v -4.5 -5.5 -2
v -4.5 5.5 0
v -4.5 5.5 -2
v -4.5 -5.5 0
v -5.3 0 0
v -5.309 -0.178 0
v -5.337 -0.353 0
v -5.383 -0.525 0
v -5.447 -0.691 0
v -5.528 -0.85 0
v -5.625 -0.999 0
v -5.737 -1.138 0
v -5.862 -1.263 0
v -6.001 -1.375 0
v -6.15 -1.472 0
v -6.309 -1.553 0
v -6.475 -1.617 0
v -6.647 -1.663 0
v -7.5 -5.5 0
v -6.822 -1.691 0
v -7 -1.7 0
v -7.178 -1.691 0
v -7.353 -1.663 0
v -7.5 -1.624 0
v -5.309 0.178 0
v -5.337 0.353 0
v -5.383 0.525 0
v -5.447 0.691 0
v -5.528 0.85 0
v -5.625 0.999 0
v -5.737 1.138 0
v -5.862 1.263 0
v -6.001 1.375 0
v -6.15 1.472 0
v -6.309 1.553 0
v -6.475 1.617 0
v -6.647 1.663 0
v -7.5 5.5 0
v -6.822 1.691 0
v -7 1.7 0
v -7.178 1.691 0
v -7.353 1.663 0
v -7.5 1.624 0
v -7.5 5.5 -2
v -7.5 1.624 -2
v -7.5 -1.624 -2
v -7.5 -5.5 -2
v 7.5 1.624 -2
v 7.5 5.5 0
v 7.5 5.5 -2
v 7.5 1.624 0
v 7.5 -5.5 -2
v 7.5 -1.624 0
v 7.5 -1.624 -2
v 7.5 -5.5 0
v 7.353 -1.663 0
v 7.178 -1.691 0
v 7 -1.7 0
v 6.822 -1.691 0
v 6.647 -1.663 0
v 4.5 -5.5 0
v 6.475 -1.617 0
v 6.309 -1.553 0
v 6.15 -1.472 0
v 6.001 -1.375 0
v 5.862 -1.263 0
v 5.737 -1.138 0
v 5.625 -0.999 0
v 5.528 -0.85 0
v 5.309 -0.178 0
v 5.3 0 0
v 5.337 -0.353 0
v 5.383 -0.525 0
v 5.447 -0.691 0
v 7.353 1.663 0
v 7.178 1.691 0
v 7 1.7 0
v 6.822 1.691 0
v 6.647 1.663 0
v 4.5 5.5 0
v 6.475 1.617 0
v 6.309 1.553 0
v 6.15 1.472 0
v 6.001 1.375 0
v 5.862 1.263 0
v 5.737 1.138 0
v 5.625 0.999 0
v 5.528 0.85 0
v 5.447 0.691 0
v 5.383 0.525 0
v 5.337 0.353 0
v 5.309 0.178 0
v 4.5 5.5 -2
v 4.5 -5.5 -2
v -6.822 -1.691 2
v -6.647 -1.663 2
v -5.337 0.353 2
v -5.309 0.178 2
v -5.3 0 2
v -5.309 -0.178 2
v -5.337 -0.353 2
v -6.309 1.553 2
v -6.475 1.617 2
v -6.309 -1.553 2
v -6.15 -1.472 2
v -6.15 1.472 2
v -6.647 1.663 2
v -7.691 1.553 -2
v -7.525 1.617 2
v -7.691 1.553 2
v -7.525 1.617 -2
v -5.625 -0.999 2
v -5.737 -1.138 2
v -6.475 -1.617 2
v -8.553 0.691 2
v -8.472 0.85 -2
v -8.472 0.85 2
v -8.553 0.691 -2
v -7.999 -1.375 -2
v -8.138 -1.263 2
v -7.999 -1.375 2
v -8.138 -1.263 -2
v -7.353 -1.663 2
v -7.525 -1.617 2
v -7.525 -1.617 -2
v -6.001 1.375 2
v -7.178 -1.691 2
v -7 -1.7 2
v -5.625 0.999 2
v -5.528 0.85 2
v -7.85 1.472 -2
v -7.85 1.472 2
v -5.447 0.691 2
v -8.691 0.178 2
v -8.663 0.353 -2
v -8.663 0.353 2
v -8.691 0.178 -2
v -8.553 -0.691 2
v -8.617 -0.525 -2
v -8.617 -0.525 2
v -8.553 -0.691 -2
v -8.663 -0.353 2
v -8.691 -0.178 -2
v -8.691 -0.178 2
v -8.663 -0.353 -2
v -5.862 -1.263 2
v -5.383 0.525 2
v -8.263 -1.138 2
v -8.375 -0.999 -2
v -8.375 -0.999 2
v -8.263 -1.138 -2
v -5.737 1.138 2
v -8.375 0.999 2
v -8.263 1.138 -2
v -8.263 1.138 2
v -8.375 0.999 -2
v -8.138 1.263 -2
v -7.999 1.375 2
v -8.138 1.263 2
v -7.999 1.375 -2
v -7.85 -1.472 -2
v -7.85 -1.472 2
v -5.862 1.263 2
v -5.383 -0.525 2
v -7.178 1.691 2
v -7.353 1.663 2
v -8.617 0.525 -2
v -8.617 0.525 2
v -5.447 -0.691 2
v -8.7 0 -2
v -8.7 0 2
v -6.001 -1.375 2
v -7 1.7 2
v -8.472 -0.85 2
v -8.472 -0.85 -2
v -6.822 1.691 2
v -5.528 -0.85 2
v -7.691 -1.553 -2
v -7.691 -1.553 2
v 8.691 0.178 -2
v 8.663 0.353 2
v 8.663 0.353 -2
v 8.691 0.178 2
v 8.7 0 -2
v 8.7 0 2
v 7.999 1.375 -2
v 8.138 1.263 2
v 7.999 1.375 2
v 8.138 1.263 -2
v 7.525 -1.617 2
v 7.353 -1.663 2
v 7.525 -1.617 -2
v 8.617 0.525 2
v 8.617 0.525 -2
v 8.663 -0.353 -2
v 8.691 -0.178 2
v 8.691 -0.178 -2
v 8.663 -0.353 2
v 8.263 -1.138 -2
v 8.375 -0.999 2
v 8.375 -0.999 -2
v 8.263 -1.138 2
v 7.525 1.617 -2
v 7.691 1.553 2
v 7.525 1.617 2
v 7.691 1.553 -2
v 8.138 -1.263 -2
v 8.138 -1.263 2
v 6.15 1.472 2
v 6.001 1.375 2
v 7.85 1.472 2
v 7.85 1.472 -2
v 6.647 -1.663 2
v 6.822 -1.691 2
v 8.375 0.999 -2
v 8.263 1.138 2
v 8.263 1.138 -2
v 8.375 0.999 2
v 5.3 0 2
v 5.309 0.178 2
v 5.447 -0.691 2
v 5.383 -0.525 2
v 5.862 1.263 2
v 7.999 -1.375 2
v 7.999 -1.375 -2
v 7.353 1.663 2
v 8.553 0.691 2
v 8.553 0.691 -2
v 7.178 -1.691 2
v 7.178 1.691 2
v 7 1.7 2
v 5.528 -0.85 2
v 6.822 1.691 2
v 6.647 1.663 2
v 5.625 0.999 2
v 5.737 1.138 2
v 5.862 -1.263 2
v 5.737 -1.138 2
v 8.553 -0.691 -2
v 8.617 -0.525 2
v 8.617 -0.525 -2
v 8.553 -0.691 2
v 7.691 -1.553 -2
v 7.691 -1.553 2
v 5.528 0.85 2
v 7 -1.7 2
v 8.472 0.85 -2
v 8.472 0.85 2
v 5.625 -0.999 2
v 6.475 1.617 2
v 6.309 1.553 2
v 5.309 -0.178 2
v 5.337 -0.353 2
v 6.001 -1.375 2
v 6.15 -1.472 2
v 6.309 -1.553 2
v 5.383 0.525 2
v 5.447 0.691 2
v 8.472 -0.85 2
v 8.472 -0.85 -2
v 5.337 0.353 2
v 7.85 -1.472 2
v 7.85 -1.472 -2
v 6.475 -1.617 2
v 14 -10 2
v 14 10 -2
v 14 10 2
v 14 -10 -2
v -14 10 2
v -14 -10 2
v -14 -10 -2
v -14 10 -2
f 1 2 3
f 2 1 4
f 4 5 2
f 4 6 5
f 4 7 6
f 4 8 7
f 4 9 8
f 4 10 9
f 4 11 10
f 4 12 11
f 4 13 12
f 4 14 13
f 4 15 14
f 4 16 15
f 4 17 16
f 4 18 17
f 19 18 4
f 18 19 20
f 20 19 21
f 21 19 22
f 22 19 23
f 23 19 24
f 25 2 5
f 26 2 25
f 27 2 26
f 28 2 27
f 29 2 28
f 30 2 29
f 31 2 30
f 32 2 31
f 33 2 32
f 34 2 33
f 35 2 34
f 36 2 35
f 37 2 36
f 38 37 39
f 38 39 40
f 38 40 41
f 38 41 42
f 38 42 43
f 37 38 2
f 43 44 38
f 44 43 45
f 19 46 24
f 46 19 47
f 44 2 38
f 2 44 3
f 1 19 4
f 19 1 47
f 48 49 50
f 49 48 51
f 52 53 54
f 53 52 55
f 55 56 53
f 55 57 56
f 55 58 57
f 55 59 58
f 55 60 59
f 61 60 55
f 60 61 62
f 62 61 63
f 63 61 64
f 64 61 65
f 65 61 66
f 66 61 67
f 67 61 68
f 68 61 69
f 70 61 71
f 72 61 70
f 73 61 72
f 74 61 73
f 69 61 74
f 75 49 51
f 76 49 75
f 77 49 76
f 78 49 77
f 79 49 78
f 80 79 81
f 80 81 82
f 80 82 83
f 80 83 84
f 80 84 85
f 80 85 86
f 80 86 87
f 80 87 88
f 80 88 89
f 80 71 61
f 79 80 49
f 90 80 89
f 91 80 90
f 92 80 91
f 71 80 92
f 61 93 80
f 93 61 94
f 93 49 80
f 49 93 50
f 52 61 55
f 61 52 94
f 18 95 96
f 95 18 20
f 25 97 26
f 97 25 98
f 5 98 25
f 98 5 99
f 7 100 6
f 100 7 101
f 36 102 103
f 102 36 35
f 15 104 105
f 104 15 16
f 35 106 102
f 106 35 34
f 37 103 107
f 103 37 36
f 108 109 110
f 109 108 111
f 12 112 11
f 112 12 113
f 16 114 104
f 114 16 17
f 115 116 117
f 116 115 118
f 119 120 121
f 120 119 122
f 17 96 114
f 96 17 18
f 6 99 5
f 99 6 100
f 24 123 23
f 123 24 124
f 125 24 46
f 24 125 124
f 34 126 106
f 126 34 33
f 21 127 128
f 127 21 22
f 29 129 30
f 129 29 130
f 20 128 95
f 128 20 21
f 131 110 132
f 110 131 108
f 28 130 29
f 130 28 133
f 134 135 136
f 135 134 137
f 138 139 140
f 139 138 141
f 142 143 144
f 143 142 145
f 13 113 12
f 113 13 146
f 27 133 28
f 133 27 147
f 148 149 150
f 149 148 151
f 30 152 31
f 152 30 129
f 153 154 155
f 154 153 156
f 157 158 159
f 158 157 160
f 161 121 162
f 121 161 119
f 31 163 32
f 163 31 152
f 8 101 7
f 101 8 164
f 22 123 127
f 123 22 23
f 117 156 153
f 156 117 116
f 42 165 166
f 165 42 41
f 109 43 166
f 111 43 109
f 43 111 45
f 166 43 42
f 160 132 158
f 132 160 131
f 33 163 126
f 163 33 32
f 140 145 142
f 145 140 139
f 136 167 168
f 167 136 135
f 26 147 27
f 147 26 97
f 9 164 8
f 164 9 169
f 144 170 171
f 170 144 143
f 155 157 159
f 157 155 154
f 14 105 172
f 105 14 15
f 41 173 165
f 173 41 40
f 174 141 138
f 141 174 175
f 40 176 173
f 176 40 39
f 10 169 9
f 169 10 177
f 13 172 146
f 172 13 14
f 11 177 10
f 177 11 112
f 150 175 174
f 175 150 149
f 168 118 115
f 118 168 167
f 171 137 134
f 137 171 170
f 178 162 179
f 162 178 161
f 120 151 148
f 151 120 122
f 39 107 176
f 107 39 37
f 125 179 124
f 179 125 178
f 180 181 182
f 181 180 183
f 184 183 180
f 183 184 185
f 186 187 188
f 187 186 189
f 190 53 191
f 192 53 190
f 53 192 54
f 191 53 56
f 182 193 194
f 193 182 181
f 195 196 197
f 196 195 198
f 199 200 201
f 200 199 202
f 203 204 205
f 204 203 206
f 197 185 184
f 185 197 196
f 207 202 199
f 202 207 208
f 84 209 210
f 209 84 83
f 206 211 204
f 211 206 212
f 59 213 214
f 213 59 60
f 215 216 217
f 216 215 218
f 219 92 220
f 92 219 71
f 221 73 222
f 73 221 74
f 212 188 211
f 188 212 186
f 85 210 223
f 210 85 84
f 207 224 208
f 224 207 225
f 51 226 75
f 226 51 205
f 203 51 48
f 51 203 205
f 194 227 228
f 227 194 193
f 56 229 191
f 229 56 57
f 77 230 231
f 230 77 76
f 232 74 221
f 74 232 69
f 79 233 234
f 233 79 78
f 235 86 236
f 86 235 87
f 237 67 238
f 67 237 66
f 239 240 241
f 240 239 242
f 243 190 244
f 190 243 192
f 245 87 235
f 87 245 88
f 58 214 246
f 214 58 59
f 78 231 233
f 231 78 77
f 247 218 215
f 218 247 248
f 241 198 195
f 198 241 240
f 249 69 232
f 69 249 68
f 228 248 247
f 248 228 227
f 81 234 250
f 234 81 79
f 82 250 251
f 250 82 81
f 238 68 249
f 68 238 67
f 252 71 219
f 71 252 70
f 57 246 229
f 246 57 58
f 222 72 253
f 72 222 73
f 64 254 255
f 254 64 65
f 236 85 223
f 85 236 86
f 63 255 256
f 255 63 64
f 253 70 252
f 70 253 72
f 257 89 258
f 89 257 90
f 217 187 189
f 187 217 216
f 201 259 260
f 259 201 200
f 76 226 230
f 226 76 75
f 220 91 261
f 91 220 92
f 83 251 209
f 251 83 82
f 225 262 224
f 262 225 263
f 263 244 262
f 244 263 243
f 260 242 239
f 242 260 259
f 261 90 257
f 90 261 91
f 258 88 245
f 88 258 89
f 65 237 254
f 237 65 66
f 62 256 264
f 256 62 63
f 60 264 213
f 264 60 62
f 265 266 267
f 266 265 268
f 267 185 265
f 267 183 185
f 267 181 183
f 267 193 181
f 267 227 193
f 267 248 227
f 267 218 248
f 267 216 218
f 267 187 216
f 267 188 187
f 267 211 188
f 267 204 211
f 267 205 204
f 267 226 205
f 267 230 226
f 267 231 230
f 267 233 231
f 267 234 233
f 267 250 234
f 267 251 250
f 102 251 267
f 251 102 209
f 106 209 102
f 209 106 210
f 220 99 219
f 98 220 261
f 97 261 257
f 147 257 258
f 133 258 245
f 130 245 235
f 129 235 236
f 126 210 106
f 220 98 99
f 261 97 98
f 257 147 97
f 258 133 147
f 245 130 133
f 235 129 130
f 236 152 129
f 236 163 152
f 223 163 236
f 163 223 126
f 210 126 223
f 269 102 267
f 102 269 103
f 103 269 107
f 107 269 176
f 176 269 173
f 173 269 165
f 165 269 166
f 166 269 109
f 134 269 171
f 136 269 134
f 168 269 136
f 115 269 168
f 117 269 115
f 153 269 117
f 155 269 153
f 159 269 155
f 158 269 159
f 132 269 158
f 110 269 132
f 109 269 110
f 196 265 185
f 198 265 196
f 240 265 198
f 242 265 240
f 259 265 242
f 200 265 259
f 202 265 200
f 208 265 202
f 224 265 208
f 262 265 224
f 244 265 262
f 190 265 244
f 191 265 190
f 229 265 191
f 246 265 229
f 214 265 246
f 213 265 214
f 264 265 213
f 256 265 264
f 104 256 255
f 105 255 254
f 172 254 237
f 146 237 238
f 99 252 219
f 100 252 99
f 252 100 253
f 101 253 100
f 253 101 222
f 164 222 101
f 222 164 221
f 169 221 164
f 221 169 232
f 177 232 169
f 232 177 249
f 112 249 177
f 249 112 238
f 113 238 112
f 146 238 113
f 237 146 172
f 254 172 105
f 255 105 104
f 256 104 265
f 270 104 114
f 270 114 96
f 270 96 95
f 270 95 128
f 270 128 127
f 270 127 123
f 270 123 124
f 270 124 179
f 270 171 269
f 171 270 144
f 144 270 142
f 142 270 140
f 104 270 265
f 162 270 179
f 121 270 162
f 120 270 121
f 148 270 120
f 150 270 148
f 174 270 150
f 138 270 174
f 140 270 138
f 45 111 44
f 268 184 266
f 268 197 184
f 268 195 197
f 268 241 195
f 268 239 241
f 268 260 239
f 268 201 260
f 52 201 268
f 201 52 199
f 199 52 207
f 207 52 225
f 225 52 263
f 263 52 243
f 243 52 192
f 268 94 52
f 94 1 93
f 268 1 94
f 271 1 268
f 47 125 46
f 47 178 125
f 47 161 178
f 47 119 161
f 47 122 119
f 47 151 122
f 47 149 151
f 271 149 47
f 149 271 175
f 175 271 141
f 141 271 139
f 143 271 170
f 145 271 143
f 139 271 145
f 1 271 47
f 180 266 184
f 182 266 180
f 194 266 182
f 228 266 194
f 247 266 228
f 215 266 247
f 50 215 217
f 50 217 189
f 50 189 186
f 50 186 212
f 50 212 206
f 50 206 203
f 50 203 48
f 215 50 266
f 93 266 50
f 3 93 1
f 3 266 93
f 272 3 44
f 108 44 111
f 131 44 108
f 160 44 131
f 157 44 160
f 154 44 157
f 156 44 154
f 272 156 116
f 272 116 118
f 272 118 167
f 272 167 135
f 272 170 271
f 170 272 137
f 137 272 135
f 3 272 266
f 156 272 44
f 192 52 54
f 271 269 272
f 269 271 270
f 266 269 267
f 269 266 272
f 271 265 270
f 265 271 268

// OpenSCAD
// Cable-tie base with two strap slots.
$fn = 60;
eps = 0.02;
base_w = 20;
base_l = 28;
base_t = 4;
slot_w = 3;
slot_l = 12;
difference() {
    cube([base_l,base_w,base_t],center=true);
    for (x=[-slot_l/2,slot_l/2]) translate([x,0,-base_t/2-eps]) cube([slot_w,base_w*0.55,base_t+2*eps],center=true);
    for (x=[-base_l/2+7,base_l/2-7]) translate([x,0,-base_t/2-eps]) cylinder(d=3.4,h=base_t+2*eps);
}
